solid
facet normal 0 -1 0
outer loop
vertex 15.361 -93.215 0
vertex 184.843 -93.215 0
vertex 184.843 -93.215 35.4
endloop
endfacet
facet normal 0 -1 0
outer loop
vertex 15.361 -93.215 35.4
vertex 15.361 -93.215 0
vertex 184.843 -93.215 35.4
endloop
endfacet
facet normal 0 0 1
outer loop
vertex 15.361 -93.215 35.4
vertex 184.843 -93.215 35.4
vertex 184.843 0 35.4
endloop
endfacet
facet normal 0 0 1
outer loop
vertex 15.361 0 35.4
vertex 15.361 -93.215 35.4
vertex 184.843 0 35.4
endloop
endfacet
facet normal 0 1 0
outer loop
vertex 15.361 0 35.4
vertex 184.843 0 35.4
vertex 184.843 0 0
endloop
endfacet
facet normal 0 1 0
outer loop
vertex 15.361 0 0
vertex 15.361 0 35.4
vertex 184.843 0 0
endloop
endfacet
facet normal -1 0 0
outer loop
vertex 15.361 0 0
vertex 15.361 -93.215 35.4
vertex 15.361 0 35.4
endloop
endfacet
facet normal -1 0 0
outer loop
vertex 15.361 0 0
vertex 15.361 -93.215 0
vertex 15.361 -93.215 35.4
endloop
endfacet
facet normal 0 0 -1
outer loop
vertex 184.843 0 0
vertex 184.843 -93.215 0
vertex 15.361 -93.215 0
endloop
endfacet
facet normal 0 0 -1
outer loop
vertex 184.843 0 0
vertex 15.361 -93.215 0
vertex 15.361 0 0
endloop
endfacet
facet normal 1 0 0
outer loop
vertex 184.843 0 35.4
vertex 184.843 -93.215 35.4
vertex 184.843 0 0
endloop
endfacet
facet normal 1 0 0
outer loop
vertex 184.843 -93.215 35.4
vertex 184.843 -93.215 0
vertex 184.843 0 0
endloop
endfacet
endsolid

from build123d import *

# Parameters (mm, degrees)
F0_W     = 64.0112925321
F0_H     = 93.2149514556
F2_DEPTH = 25.4
F3_DEPTH = 10
F4_DEPTH = 74.6595710516
F5_DEPTH = 30.8117810637


with BuildPart() as f2:
    # F0 (on Top) → F2 (new body)
    with BuildSketch(Plane.XY):
        with Locations((47.3664468154, -46.6074757278)):
            Rectangle(F0_W, F0_H)
    extrude(amount=F2_DEPTH)

    # F3 (add): a face of the model
    f3_faces = [f2.faces().sort_by_distance(p)[0] for p in [
        (47.3664468154, -46.6074757278, 25.4),
    ]]
    extrude(f3_faces, amount=F3_DEPTH)

    # F4 (add): a face of the model
    f4_faces = [f2.faces().sort_by_distance(p)[0] for p in [
        (79.3720930815, -46.6074757278, 17.7),
    ]]
    extrude(f4_faces, amount=F4_DEPTH)

    # F5 (add): a face of the model
    f5_faces = [f2.faces().sort_by_distance(p)[0] for p in [
        (154.0316641331, -46.6074757278, 17.7),
    ]]
    extrude(f5_faces, amount=F5_DEPTH)


solid = f2.part
